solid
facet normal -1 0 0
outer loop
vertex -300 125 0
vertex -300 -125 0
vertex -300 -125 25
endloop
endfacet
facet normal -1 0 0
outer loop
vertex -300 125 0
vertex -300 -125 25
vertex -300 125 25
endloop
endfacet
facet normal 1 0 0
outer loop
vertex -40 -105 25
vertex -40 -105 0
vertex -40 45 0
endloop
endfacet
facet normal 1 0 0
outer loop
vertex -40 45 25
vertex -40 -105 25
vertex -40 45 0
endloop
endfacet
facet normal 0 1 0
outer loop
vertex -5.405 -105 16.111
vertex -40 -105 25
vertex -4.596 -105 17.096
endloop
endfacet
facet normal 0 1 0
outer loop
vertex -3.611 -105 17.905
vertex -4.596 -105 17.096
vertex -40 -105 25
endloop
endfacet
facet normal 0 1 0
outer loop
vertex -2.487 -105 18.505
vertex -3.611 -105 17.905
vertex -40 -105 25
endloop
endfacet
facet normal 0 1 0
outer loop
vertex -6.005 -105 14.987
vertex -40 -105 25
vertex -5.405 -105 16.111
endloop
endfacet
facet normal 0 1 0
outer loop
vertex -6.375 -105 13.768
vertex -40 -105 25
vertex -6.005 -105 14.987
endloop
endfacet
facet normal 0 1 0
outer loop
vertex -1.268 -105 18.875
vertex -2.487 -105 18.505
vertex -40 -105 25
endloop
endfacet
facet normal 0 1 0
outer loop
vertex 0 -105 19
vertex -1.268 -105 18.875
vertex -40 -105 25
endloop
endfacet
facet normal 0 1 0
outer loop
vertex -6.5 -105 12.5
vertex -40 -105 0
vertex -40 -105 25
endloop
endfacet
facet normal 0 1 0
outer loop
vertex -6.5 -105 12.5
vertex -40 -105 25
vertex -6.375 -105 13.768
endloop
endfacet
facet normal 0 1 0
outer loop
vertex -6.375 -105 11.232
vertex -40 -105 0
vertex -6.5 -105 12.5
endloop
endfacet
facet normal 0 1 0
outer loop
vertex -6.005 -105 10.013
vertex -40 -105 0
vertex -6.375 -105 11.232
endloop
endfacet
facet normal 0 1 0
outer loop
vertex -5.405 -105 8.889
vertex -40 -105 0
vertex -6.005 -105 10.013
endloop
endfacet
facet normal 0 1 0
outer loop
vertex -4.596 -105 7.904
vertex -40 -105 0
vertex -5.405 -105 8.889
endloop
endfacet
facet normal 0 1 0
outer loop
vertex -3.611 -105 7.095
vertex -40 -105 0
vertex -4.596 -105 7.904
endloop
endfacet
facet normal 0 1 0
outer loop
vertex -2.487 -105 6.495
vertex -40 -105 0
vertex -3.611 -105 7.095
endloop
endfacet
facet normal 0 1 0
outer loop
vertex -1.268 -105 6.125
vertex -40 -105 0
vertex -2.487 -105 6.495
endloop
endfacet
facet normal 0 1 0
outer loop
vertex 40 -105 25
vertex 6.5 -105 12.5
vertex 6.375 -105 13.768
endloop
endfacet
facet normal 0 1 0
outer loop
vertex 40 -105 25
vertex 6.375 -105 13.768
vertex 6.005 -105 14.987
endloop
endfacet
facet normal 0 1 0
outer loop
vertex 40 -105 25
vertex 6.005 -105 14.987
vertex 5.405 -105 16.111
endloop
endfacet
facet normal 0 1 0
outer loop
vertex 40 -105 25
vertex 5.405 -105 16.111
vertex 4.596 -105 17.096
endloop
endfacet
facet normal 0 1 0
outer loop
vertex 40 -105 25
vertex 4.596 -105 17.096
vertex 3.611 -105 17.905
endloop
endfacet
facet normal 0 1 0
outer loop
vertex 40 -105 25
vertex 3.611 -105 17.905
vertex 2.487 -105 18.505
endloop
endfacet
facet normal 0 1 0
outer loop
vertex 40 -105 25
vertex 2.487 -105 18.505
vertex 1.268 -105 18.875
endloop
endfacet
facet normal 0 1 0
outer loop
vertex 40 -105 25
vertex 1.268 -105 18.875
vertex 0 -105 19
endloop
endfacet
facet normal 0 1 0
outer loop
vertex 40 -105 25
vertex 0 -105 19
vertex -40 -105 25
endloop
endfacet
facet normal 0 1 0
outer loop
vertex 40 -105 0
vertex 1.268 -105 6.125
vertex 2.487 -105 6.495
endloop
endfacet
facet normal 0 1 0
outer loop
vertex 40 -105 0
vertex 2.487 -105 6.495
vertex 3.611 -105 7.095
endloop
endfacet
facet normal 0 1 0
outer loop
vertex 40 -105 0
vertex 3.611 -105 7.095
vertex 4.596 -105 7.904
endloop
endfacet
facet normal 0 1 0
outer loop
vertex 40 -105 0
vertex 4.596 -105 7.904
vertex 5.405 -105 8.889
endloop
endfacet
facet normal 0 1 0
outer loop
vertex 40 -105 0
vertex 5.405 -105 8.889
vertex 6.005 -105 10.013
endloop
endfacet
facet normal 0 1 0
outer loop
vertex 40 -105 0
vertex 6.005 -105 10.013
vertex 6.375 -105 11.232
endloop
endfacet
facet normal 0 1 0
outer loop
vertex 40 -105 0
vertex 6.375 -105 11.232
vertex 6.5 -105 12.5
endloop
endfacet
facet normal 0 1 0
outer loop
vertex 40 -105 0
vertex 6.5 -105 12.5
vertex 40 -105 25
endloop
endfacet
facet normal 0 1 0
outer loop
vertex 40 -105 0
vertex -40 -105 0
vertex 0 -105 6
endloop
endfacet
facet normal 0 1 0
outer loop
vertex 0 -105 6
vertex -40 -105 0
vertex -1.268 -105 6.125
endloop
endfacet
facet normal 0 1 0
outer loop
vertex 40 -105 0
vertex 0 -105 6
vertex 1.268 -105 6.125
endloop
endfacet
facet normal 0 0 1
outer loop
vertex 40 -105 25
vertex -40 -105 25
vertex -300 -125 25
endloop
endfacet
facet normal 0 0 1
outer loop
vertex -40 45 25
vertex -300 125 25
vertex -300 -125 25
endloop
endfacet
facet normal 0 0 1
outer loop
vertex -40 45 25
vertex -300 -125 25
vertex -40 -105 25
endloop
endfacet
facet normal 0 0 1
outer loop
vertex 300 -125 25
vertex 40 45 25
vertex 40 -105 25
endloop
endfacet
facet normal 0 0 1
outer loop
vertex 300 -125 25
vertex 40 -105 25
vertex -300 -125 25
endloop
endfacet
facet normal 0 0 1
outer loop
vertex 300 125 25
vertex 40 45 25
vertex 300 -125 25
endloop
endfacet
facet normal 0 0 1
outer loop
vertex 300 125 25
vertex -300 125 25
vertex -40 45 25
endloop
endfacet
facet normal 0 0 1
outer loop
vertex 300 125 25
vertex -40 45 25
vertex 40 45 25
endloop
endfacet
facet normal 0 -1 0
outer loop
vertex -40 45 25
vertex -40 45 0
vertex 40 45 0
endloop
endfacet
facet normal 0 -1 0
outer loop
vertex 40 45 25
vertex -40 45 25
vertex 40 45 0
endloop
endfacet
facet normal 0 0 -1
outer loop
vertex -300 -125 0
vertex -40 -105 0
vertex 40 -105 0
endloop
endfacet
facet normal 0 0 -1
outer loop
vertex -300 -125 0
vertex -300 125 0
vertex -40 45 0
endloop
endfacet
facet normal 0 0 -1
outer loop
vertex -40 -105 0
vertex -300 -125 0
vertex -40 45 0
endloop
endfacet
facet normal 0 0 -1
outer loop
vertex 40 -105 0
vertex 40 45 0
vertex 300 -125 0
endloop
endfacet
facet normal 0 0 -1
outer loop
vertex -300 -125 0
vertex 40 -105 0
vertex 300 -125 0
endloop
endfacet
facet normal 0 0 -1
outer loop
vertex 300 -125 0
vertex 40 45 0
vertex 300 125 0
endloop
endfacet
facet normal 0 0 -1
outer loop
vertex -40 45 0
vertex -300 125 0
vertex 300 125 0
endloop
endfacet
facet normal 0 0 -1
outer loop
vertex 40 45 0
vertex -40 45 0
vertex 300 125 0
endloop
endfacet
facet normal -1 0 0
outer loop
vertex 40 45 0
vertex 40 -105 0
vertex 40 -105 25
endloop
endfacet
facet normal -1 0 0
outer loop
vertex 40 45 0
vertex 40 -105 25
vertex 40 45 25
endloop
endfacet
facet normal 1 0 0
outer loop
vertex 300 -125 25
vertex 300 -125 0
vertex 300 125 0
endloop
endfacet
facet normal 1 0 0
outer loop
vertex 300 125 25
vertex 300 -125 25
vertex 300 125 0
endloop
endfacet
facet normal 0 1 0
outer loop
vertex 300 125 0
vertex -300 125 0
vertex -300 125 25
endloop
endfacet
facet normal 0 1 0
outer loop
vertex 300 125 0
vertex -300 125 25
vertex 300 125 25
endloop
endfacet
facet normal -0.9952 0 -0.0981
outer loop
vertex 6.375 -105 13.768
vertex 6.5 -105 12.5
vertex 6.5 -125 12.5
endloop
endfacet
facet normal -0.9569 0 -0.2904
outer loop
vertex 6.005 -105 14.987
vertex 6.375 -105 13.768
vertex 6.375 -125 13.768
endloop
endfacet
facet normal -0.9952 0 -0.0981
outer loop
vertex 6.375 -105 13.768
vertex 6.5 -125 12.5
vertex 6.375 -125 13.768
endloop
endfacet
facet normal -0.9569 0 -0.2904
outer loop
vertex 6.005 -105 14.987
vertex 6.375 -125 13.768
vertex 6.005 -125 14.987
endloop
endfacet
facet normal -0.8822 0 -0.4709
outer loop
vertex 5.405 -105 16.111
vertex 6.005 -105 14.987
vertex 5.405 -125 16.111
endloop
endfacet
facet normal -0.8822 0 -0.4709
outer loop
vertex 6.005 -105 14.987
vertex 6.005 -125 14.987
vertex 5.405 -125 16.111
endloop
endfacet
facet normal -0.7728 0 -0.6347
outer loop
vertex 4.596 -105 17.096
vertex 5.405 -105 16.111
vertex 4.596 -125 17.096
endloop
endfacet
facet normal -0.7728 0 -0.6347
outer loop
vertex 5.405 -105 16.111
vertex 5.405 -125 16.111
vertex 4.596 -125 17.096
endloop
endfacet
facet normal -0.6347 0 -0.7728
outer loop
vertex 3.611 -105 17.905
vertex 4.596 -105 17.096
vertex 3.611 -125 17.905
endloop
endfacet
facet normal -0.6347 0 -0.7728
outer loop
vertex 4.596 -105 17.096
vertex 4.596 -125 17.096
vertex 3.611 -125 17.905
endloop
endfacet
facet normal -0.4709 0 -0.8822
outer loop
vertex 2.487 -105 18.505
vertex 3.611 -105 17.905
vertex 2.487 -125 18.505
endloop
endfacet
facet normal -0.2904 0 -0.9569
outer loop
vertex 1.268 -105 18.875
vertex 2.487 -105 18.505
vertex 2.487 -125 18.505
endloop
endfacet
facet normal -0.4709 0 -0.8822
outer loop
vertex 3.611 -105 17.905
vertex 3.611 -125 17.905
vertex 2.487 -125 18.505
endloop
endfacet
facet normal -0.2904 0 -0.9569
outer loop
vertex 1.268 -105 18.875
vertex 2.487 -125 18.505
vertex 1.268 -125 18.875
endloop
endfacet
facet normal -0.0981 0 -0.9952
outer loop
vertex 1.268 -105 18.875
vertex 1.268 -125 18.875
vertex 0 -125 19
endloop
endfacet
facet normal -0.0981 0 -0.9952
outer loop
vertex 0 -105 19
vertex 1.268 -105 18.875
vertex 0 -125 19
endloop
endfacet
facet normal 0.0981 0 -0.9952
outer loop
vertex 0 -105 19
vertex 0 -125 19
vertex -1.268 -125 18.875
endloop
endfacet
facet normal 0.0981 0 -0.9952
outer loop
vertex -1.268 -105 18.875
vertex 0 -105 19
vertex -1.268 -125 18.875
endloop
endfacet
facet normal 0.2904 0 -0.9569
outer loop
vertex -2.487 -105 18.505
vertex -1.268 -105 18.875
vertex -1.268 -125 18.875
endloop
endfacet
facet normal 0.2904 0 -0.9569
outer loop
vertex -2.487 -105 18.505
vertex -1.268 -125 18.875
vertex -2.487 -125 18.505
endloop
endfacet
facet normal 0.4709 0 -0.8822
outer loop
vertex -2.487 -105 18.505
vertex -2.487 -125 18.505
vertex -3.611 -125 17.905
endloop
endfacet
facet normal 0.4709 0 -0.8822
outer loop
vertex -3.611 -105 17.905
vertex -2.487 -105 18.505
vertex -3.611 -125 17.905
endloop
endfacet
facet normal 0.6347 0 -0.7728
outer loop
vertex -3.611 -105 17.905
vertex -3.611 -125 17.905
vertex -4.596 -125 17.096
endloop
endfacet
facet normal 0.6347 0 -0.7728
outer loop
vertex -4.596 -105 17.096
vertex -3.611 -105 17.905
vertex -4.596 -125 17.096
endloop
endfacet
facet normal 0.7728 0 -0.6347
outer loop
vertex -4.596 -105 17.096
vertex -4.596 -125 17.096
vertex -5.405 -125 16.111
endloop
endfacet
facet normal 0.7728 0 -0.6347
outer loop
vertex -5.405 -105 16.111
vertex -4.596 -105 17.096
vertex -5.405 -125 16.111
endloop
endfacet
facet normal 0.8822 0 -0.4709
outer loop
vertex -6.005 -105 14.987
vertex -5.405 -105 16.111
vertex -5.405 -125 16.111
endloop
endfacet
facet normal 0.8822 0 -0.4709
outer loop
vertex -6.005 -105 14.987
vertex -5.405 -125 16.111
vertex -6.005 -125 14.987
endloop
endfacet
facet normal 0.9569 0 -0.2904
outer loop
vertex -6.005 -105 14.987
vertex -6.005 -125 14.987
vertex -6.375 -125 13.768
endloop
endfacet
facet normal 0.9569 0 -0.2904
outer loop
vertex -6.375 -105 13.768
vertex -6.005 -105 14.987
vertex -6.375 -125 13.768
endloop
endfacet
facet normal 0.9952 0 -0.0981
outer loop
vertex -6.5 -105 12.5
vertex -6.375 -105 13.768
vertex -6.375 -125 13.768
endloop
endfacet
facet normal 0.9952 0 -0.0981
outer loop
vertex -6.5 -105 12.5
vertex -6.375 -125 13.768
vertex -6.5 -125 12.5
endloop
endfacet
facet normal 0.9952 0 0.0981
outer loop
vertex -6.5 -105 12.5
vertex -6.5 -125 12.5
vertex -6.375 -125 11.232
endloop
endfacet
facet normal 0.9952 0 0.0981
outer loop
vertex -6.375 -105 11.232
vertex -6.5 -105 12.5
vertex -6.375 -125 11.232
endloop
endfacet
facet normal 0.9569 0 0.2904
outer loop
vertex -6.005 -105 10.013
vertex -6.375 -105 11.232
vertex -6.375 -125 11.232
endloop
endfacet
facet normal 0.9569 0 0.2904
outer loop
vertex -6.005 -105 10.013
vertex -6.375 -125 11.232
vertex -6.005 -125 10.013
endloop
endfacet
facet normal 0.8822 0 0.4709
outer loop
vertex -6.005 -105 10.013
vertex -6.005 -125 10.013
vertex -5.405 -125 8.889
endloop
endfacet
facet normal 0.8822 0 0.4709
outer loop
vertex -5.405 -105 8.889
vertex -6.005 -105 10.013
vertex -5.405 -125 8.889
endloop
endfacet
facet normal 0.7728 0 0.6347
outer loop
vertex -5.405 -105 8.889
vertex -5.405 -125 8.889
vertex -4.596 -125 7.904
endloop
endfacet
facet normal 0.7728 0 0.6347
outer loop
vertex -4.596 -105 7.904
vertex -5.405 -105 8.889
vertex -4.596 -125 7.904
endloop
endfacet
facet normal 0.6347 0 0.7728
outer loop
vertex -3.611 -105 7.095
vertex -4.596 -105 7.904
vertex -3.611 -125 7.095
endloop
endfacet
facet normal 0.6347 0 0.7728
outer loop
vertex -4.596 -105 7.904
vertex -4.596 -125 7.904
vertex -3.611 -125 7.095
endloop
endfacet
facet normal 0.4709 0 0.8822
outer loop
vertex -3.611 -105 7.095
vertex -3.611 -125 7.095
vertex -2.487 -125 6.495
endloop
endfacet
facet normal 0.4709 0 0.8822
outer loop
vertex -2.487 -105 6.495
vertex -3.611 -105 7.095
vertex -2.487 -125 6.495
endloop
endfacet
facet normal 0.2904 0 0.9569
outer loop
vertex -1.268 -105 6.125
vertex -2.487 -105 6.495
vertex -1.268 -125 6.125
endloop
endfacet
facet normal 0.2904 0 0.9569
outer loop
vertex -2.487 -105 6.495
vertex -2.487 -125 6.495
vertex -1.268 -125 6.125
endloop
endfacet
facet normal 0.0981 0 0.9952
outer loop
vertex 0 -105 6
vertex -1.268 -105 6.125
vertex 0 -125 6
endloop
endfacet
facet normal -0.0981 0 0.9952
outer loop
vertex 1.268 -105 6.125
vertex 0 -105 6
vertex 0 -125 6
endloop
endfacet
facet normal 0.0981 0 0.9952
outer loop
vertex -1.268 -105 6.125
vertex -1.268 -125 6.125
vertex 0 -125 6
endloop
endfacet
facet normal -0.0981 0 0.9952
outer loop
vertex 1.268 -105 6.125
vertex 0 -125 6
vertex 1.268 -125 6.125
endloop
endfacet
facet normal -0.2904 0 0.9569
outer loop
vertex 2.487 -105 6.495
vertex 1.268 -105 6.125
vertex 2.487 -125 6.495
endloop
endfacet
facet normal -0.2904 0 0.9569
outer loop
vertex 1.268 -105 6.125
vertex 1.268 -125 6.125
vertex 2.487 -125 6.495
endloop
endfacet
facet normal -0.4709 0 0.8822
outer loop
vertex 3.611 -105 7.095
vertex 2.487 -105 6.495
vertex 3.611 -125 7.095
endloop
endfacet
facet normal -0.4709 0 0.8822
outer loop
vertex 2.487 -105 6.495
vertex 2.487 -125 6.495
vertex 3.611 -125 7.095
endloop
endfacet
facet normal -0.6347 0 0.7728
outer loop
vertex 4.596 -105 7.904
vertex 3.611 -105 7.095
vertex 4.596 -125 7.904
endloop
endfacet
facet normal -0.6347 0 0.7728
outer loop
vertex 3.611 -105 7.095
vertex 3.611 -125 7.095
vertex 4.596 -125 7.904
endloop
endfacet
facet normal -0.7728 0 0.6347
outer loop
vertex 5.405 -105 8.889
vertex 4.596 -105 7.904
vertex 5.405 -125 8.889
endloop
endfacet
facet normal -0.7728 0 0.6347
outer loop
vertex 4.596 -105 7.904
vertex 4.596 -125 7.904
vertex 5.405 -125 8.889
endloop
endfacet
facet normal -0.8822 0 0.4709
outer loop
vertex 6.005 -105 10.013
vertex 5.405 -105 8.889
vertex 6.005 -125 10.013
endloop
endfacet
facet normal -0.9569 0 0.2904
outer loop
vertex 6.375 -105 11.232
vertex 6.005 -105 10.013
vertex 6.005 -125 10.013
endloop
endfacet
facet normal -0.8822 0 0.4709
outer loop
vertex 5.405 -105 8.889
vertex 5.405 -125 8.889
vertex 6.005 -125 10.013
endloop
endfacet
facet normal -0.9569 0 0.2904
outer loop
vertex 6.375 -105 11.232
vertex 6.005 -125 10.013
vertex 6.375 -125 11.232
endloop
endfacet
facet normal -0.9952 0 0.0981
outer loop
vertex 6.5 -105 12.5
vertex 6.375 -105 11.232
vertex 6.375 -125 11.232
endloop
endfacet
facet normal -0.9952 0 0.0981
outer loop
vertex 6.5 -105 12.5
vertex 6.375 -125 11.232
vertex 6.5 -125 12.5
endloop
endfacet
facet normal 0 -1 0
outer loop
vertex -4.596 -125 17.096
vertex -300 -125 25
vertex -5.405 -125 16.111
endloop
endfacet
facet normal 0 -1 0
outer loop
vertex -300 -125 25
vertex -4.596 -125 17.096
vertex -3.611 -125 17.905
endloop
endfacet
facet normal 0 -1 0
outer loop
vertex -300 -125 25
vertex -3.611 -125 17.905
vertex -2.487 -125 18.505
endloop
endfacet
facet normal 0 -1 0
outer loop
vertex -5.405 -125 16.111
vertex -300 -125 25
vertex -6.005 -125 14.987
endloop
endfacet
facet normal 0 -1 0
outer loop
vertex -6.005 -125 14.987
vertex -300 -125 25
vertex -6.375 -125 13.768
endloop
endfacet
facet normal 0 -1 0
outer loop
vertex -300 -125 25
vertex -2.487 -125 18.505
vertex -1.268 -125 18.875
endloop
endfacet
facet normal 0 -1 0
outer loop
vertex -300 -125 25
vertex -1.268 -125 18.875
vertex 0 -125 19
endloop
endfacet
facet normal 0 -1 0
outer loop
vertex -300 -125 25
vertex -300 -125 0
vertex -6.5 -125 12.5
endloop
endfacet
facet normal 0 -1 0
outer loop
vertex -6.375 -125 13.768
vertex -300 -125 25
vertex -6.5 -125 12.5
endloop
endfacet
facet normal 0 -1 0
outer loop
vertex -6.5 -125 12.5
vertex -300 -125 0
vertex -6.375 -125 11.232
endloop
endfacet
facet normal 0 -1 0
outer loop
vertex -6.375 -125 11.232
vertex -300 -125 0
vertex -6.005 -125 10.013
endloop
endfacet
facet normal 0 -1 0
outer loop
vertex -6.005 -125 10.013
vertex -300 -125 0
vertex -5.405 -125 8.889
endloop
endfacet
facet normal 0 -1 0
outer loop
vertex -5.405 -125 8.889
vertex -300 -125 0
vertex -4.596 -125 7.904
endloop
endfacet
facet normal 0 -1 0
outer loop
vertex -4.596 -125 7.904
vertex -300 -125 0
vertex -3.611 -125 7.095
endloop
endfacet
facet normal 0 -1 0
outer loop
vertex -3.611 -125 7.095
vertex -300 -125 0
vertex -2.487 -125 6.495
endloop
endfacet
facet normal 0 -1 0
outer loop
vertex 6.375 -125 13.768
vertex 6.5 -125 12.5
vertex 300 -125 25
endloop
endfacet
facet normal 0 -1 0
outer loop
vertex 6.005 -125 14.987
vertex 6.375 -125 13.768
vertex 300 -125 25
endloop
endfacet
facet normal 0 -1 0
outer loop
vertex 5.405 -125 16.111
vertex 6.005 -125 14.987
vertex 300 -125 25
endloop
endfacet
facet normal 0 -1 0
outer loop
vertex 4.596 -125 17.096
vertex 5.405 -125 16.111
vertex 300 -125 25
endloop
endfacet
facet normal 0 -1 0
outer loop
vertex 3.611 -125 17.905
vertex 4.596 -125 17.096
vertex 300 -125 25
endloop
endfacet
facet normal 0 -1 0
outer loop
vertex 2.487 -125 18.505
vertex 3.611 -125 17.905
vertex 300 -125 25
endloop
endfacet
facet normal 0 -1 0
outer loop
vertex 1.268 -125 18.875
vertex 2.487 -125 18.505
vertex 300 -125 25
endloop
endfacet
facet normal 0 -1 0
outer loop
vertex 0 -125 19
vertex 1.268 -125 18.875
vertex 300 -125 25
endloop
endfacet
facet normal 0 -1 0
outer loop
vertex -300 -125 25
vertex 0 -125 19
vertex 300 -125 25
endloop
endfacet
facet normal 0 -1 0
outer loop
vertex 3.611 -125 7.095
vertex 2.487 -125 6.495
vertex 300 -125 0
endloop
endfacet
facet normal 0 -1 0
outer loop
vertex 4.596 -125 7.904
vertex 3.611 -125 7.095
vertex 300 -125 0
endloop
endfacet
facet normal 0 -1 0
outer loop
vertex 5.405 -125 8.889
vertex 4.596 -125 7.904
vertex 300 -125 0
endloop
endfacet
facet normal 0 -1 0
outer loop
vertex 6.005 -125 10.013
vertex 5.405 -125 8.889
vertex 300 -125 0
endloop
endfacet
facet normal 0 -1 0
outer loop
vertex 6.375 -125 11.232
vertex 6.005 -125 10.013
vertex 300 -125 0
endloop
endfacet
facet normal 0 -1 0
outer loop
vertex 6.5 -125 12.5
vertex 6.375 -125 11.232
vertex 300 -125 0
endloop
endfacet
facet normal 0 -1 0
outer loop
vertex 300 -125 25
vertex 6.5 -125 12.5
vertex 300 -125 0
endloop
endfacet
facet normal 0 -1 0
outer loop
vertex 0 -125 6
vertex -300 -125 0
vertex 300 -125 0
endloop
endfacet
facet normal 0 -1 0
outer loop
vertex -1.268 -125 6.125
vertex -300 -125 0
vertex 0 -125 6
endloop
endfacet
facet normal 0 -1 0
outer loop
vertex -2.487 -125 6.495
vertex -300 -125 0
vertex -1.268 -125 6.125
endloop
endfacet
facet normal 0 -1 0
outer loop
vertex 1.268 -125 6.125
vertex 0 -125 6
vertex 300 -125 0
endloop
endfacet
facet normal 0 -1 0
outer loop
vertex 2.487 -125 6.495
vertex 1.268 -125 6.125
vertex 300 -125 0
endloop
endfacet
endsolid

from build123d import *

# Parameters (mm, degrees)
CROQUIS1_W              = 600
CROQUIS1_H              = 250
CROQUIS1_W_2            = 80
CROQUIS1_H_2            = 150
SALIENTE_EXTRUIR2_DEPTH = 25
CORTAR_EXTRUIR2_REACH   = 252
CROQUIS3_R              = 6.5


with BuildPart() as part:
    # Croquis1 → Saliente-Extruir2 (new body)
    with BuildSketch(Plane.XY):
        Rectangle(CROQUIS1_W, CROQUIS1_H)
        with Locations((0, -30)):
            Rectangle(CROQUIS1_W_2, CROQUIS1_H_2, mode=Mode.SUBTRACT)
    extrude(amount=SALIENTE_EXTRUIR2_DEPTH)

    # Croquis3 → Cortar-Extruir2 (cut, up to next)
    with BuildSketch(Plane.XZ.offset(125), mode=Mode.PRIVATE) as cortar_extruir2_sk1:
        with Locations((0, 12.5)):
            Circle(CROQUIS3_R)
    cortar_extruir2_tool1 = extrude(cortar_extruir2_sk1.sketch, amount=-CORTAR_EXTRUIR2_REACH, mode=Mode.PRIVATE) & part.part
    add(cortar_extruir2_tool1.solids().sort_by_distance((0, -125, 12.5))[0], mode=Mode.SUBTRACT)


solid = part.part
